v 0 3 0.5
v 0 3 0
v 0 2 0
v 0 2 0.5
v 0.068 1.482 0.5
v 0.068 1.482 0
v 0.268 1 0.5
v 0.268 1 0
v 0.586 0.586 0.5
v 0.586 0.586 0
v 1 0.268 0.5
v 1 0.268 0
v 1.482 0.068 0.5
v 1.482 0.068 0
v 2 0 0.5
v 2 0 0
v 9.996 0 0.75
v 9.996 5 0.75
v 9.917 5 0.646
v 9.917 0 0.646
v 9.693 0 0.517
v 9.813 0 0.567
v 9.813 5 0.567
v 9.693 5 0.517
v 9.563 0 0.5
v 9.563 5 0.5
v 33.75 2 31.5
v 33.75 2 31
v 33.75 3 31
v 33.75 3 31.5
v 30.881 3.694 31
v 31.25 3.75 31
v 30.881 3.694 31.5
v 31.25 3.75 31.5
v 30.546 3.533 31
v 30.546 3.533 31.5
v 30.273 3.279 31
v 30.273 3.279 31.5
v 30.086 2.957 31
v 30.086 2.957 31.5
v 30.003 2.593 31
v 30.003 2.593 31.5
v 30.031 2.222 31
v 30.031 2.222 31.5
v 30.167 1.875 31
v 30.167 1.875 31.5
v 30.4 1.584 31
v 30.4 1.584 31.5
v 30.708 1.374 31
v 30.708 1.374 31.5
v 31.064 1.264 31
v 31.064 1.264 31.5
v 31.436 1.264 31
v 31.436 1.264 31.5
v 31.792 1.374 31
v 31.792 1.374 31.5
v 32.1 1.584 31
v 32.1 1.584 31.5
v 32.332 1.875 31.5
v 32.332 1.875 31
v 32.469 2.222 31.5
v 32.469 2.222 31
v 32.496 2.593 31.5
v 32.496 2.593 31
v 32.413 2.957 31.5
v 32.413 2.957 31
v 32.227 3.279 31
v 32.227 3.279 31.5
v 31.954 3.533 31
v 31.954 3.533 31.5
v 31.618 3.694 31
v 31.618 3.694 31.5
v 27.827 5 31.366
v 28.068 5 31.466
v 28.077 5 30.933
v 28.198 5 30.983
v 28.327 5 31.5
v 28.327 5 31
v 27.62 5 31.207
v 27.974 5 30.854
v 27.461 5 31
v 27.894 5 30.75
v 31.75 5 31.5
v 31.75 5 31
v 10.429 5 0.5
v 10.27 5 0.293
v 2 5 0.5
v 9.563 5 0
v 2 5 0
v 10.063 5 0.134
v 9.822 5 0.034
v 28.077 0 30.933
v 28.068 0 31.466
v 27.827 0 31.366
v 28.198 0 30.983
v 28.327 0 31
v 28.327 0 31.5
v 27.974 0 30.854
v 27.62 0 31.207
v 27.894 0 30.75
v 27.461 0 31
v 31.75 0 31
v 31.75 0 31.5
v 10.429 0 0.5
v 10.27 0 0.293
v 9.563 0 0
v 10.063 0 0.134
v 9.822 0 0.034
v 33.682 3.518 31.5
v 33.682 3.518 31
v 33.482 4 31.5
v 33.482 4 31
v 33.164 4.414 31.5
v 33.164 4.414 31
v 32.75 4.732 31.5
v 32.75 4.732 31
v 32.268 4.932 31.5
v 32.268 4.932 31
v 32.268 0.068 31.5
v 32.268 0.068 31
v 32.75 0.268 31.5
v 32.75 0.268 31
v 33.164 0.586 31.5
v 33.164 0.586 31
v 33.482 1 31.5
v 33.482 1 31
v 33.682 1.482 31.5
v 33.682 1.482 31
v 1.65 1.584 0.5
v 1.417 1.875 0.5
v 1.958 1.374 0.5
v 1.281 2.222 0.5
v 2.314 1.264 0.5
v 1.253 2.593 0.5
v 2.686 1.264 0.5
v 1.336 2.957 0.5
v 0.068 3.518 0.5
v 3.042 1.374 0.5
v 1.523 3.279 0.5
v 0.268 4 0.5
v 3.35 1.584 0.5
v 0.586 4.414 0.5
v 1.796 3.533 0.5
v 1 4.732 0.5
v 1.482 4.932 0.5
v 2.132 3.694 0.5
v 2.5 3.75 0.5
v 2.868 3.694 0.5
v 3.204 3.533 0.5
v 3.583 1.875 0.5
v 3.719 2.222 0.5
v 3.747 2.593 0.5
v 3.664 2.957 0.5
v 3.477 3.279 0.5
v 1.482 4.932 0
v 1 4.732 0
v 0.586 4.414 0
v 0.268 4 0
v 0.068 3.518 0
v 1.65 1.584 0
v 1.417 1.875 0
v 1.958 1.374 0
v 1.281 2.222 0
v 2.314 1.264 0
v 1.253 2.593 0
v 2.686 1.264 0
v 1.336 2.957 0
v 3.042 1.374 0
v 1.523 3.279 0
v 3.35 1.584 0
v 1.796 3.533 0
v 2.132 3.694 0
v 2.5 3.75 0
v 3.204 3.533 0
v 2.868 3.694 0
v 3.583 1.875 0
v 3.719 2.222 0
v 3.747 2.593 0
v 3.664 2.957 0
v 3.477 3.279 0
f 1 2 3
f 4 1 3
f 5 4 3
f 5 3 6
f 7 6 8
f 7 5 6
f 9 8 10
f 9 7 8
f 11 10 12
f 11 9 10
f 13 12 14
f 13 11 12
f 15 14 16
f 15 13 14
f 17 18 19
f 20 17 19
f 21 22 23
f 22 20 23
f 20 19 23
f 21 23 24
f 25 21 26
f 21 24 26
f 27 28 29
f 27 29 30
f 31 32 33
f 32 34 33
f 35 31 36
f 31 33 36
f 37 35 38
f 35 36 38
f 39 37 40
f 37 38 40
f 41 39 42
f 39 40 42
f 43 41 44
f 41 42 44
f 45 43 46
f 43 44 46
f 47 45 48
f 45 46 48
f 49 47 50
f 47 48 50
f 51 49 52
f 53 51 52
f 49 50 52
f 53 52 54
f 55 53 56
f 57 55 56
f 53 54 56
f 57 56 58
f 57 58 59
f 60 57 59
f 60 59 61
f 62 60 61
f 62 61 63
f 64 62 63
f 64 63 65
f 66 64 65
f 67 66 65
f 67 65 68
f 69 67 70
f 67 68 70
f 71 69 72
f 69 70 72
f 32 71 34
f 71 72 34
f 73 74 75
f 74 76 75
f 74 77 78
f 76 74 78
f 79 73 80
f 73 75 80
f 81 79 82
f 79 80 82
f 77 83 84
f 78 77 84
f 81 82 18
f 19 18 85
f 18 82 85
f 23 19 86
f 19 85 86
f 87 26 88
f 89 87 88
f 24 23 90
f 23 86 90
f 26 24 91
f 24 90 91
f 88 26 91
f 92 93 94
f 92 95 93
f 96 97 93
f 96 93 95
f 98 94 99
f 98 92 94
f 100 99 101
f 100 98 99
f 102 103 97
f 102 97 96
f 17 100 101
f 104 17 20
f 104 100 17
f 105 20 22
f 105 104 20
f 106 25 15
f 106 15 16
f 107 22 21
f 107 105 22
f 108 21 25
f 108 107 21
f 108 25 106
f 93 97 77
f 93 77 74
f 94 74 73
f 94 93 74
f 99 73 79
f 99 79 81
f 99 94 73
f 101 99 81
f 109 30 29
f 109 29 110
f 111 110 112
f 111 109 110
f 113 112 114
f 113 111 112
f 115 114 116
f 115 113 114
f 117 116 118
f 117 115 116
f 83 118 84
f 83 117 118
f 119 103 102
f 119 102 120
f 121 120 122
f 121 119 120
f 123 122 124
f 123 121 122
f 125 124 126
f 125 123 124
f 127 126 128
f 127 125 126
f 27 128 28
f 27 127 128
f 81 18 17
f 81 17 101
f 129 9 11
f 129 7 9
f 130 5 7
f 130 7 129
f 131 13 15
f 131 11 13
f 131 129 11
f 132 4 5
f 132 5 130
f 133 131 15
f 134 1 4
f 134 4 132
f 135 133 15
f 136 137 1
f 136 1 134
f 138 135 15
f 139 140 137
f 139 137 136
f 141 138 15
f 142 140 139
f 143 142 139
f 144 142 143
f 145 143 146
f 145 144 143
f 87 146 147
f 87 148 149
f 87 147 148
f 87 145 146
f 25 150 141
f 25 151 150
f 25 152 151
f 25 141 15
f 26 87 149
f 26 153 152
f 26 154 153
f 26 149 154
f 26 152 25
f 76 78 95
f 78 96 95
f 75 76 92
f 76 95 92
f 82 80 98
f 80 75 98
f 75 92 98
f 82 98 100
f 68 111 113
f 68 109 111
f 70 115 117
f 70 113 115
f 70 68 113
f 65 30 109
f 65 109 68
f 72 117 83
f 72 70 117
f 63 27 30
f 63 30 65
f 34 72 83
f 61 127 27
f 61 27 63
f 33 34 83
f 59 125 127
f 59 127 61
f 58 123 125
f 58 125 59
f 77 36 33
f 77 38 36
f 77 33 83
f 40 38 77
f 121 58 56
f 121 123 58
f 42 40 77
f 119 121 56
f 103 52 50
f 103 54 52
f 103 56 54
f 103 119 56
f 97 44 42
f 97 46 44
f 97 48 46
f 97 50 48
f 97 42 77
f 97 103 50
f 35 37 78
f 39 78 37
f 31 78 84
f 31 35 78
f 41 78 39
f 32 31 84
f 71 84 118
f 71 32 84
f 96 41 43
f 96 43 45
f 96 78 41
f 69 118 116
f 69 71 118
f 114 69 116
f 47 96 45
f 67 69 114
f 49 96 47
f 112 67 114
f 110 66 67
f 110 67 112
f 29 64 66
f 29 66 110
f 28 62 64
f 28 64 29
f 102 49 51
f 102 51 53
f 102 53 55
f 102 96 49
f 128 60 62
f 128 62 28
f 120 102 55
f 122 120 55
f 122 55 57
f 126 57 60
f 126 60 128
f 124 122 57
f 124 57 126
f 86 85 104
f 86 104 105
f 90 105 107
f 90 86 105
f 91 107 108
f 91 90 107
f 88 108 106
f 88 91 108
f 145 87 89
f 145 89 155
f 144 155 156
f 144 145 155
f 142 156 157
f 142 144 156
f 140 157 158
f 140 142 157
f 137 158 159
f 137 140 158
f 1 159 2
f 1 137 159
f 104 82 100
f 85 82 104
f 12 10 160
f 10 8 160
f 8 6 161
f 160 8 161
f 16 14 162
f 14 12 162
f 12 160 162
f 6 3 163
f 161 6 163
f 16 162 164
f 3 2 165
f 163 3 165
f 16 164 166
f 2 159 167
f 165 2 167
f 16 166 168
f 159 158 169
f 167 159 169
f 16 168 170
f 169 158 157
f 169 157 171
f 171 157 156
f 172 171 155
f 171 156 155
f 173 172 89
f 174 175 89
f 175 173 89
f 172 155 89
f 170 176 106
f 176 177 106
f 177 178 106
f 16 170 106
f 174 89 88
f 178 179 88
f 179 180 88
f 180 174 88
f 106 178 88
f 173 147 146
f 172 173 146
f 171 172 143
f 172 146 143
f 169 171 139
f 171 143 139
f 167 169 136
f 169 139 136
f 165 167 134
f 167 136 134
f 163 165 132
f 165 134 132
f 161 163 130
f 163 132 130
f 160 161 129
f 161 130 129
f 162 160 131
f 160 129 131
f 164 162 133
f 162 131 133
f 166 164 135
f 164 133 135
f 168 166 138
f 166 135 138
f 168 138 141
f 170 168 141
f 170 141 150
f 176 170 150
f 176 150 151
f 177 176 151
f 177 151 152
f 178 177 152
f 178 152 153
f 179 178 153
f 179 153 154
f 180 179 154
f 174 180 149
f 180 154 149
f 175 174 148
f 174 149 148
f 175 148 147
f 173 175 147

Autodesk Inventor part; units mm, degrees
ref_plane "YZ Plane" through (0, 0, 0) normal (1, 0, 0) x (0, 1, 0)
ref_plane "XZ Plane" through (0, 0, 0) normal (0, 1, 0) x (-1, 0, 0)
ref_plane "XY Plane" through (0, 0, 0) normal (0, 0, 1) x (1, 0, 0)
sketch "Sketch1" plane through (0, 0, 0) normal (0, 0, 1) x (1, 0, 0)
  point P0 (0, 0)
sketch "Sketch2" plane through (0, 0, 0) normal (0, 0, 1) x (1, 0, 0)
  line L0 (0, 0) -> (9.852, 0)
  line L1 (9.852, 0) -> (9.852, 5)
  line L2 (9.852, 5) -> (0, 5)
  line L3 (0, 5) -> (0, 0)
  dimension "d0" = 5
  dimension "d1" = 9.852
extrude "Plate1" add sketch "Sketch2" along normal blind 0.5
sketch "Sketch3" plane through (9.852, 5, 0.5) normal (0.8660254, 0, -0.5) x (0, 1, 0)
  line L0 (-5, 0) -> (0, 0)
  line L1 (0, 0) -> (0, 35.507)
  line L2 (0, 35.507) -> (-5, 35.507)
  line L3 (-5, 35.507) -> (-5, 0)
edge flange "Flange1" height 35.7957 angle 60 thickness 0.5 bend radius 0.5 thickness toward (0.8660254, 0, -0.5) relief tear relief width 0.5 relief depth 0.25 edges at (9.852, 2.5, 0.5) wall of the first edge with corners at (9.852, 0, 0.5) (9.852, 5, 0.5) (27.6055, 5, 31.25) (27.6055, 0, 31.25)
bend "Bend1"
corner "Corner1"
sketch "Sketch4" plane through (28.0385, 0, 31) normal (0, 0, 1) x (1, 0, 0)
  line L0 (0, 5) -> (0, 0)
  line L1 (0, 0) -> (5.7113, 0)
  line L2 (5.7113, 0) -> (5.7113, 5)
  line L3 (5.7113, 5) -> (0, 5)
edge flange "Flange2" height 6 angle 60 thickness 0.5 bend radius 0.5 thickness toward (0, 0, 1) relief tear relief width 0.5 relief depth 0.25 edges at (28.0385, 2.5, 31) wall of the first edge with corners at (28.0385, 5, 31) (28.0385, 0, 31) (33.7499, 0, 31) (33.7499, 5, 31)
bend "Bend2"
corner "Corner2"
sketch "Sketch5" plane through (0, 0, 0) normal (0, 0, -1) x (-1, 0, 0)
  line L0 (-9.5633, 5) -> (-9.5633, 0) projected
  line L1 (0, 5) -> (0, 0) projected
  line L2 (0, 2.5) -> (-9.5633, 2.5) construction
  point P0 (-2.5, 2.5)
  dimension "d23" = 2.5
hole "Hole1" at (2.5, 2.5, 0) direction (0, 0, 1) diameter 2.5 depth 0.5 tip angle 118
sketch "Sketch6" plane through (33.7499, 0, 31) normal (0, 0, -1) x (-1, 0, 0)
  line L0 (5.4226, 0) -> (5.4226, 5) projected
  line L1 (0, 5) -> (0, 0) projected
  line L2 (0, 2.5) -> (5.4226, 2.5) construction
  point P0 (33.7498, 0)
  point P1 (2.5, 2.5)
  dimension "d31" = 2.5
hole "Hole2" at (31.2499, 2.5, 31) direction (0, 0, 1) diameter 2.5 depth 0.5 tip angle 118
fillet "Corner Round1" radius 2 4 edges at (0, 5, 0.25) (0, 0, 0.25) (33.7499, 0, 31.25) (33.7499, 5, 31.25)
equation "\"d29\" = Thickness"
equation "\"d37\" = Thickness"
equation "\"d3\" = BendReliefWidth"
equation "\"d4\" = BendReliefDepth"
equation "\"d5\" = MinimumRemnant"
equation "\"d6\" = BendRadius"
equation "\"d9\" = BendRadius"
equation "\"d10\" = CornerReliefSize"
equation "\"d11\" = GapSize"
equation "\"d12\" = JacobiRadiusSize"
equation "\"d13\" = BendReliefWidth"
equation "\"d14\" = BendReliefDepth"
equation "\"d15\" = MinimumRemnant"
equation "\"d16\" = BendRadius"
equation "\"d19\" = BendRadius"
equation "\"d20\" = CornerReliefSize"
equation "\"d21\" = GapSize"
equation "\"d22\" = JacobiRadiusSize"
equation "\"BendRadius\" = Thickness"
equation "\"BendReliefWidth\" = Thickness"
equation "\"BendReliefDepth\" = 0.5 * Thickness"
equation "\"CornerReliefSize\" = 4 * Thickness"
equation "\"MinimumRemnant\" = 2 * Thickness"
equation "\"TransitionRadius\" = BendRadius"
equation "\"JacobiRadiusSize\" = BendRadius"
equation "\"GapSize\" = Thickness"
equation "\"d2\" = BendRadius"
equation "\"Thickness\" = 0.5"
properties part number "core_earth_new" material "Copper, Cast"
